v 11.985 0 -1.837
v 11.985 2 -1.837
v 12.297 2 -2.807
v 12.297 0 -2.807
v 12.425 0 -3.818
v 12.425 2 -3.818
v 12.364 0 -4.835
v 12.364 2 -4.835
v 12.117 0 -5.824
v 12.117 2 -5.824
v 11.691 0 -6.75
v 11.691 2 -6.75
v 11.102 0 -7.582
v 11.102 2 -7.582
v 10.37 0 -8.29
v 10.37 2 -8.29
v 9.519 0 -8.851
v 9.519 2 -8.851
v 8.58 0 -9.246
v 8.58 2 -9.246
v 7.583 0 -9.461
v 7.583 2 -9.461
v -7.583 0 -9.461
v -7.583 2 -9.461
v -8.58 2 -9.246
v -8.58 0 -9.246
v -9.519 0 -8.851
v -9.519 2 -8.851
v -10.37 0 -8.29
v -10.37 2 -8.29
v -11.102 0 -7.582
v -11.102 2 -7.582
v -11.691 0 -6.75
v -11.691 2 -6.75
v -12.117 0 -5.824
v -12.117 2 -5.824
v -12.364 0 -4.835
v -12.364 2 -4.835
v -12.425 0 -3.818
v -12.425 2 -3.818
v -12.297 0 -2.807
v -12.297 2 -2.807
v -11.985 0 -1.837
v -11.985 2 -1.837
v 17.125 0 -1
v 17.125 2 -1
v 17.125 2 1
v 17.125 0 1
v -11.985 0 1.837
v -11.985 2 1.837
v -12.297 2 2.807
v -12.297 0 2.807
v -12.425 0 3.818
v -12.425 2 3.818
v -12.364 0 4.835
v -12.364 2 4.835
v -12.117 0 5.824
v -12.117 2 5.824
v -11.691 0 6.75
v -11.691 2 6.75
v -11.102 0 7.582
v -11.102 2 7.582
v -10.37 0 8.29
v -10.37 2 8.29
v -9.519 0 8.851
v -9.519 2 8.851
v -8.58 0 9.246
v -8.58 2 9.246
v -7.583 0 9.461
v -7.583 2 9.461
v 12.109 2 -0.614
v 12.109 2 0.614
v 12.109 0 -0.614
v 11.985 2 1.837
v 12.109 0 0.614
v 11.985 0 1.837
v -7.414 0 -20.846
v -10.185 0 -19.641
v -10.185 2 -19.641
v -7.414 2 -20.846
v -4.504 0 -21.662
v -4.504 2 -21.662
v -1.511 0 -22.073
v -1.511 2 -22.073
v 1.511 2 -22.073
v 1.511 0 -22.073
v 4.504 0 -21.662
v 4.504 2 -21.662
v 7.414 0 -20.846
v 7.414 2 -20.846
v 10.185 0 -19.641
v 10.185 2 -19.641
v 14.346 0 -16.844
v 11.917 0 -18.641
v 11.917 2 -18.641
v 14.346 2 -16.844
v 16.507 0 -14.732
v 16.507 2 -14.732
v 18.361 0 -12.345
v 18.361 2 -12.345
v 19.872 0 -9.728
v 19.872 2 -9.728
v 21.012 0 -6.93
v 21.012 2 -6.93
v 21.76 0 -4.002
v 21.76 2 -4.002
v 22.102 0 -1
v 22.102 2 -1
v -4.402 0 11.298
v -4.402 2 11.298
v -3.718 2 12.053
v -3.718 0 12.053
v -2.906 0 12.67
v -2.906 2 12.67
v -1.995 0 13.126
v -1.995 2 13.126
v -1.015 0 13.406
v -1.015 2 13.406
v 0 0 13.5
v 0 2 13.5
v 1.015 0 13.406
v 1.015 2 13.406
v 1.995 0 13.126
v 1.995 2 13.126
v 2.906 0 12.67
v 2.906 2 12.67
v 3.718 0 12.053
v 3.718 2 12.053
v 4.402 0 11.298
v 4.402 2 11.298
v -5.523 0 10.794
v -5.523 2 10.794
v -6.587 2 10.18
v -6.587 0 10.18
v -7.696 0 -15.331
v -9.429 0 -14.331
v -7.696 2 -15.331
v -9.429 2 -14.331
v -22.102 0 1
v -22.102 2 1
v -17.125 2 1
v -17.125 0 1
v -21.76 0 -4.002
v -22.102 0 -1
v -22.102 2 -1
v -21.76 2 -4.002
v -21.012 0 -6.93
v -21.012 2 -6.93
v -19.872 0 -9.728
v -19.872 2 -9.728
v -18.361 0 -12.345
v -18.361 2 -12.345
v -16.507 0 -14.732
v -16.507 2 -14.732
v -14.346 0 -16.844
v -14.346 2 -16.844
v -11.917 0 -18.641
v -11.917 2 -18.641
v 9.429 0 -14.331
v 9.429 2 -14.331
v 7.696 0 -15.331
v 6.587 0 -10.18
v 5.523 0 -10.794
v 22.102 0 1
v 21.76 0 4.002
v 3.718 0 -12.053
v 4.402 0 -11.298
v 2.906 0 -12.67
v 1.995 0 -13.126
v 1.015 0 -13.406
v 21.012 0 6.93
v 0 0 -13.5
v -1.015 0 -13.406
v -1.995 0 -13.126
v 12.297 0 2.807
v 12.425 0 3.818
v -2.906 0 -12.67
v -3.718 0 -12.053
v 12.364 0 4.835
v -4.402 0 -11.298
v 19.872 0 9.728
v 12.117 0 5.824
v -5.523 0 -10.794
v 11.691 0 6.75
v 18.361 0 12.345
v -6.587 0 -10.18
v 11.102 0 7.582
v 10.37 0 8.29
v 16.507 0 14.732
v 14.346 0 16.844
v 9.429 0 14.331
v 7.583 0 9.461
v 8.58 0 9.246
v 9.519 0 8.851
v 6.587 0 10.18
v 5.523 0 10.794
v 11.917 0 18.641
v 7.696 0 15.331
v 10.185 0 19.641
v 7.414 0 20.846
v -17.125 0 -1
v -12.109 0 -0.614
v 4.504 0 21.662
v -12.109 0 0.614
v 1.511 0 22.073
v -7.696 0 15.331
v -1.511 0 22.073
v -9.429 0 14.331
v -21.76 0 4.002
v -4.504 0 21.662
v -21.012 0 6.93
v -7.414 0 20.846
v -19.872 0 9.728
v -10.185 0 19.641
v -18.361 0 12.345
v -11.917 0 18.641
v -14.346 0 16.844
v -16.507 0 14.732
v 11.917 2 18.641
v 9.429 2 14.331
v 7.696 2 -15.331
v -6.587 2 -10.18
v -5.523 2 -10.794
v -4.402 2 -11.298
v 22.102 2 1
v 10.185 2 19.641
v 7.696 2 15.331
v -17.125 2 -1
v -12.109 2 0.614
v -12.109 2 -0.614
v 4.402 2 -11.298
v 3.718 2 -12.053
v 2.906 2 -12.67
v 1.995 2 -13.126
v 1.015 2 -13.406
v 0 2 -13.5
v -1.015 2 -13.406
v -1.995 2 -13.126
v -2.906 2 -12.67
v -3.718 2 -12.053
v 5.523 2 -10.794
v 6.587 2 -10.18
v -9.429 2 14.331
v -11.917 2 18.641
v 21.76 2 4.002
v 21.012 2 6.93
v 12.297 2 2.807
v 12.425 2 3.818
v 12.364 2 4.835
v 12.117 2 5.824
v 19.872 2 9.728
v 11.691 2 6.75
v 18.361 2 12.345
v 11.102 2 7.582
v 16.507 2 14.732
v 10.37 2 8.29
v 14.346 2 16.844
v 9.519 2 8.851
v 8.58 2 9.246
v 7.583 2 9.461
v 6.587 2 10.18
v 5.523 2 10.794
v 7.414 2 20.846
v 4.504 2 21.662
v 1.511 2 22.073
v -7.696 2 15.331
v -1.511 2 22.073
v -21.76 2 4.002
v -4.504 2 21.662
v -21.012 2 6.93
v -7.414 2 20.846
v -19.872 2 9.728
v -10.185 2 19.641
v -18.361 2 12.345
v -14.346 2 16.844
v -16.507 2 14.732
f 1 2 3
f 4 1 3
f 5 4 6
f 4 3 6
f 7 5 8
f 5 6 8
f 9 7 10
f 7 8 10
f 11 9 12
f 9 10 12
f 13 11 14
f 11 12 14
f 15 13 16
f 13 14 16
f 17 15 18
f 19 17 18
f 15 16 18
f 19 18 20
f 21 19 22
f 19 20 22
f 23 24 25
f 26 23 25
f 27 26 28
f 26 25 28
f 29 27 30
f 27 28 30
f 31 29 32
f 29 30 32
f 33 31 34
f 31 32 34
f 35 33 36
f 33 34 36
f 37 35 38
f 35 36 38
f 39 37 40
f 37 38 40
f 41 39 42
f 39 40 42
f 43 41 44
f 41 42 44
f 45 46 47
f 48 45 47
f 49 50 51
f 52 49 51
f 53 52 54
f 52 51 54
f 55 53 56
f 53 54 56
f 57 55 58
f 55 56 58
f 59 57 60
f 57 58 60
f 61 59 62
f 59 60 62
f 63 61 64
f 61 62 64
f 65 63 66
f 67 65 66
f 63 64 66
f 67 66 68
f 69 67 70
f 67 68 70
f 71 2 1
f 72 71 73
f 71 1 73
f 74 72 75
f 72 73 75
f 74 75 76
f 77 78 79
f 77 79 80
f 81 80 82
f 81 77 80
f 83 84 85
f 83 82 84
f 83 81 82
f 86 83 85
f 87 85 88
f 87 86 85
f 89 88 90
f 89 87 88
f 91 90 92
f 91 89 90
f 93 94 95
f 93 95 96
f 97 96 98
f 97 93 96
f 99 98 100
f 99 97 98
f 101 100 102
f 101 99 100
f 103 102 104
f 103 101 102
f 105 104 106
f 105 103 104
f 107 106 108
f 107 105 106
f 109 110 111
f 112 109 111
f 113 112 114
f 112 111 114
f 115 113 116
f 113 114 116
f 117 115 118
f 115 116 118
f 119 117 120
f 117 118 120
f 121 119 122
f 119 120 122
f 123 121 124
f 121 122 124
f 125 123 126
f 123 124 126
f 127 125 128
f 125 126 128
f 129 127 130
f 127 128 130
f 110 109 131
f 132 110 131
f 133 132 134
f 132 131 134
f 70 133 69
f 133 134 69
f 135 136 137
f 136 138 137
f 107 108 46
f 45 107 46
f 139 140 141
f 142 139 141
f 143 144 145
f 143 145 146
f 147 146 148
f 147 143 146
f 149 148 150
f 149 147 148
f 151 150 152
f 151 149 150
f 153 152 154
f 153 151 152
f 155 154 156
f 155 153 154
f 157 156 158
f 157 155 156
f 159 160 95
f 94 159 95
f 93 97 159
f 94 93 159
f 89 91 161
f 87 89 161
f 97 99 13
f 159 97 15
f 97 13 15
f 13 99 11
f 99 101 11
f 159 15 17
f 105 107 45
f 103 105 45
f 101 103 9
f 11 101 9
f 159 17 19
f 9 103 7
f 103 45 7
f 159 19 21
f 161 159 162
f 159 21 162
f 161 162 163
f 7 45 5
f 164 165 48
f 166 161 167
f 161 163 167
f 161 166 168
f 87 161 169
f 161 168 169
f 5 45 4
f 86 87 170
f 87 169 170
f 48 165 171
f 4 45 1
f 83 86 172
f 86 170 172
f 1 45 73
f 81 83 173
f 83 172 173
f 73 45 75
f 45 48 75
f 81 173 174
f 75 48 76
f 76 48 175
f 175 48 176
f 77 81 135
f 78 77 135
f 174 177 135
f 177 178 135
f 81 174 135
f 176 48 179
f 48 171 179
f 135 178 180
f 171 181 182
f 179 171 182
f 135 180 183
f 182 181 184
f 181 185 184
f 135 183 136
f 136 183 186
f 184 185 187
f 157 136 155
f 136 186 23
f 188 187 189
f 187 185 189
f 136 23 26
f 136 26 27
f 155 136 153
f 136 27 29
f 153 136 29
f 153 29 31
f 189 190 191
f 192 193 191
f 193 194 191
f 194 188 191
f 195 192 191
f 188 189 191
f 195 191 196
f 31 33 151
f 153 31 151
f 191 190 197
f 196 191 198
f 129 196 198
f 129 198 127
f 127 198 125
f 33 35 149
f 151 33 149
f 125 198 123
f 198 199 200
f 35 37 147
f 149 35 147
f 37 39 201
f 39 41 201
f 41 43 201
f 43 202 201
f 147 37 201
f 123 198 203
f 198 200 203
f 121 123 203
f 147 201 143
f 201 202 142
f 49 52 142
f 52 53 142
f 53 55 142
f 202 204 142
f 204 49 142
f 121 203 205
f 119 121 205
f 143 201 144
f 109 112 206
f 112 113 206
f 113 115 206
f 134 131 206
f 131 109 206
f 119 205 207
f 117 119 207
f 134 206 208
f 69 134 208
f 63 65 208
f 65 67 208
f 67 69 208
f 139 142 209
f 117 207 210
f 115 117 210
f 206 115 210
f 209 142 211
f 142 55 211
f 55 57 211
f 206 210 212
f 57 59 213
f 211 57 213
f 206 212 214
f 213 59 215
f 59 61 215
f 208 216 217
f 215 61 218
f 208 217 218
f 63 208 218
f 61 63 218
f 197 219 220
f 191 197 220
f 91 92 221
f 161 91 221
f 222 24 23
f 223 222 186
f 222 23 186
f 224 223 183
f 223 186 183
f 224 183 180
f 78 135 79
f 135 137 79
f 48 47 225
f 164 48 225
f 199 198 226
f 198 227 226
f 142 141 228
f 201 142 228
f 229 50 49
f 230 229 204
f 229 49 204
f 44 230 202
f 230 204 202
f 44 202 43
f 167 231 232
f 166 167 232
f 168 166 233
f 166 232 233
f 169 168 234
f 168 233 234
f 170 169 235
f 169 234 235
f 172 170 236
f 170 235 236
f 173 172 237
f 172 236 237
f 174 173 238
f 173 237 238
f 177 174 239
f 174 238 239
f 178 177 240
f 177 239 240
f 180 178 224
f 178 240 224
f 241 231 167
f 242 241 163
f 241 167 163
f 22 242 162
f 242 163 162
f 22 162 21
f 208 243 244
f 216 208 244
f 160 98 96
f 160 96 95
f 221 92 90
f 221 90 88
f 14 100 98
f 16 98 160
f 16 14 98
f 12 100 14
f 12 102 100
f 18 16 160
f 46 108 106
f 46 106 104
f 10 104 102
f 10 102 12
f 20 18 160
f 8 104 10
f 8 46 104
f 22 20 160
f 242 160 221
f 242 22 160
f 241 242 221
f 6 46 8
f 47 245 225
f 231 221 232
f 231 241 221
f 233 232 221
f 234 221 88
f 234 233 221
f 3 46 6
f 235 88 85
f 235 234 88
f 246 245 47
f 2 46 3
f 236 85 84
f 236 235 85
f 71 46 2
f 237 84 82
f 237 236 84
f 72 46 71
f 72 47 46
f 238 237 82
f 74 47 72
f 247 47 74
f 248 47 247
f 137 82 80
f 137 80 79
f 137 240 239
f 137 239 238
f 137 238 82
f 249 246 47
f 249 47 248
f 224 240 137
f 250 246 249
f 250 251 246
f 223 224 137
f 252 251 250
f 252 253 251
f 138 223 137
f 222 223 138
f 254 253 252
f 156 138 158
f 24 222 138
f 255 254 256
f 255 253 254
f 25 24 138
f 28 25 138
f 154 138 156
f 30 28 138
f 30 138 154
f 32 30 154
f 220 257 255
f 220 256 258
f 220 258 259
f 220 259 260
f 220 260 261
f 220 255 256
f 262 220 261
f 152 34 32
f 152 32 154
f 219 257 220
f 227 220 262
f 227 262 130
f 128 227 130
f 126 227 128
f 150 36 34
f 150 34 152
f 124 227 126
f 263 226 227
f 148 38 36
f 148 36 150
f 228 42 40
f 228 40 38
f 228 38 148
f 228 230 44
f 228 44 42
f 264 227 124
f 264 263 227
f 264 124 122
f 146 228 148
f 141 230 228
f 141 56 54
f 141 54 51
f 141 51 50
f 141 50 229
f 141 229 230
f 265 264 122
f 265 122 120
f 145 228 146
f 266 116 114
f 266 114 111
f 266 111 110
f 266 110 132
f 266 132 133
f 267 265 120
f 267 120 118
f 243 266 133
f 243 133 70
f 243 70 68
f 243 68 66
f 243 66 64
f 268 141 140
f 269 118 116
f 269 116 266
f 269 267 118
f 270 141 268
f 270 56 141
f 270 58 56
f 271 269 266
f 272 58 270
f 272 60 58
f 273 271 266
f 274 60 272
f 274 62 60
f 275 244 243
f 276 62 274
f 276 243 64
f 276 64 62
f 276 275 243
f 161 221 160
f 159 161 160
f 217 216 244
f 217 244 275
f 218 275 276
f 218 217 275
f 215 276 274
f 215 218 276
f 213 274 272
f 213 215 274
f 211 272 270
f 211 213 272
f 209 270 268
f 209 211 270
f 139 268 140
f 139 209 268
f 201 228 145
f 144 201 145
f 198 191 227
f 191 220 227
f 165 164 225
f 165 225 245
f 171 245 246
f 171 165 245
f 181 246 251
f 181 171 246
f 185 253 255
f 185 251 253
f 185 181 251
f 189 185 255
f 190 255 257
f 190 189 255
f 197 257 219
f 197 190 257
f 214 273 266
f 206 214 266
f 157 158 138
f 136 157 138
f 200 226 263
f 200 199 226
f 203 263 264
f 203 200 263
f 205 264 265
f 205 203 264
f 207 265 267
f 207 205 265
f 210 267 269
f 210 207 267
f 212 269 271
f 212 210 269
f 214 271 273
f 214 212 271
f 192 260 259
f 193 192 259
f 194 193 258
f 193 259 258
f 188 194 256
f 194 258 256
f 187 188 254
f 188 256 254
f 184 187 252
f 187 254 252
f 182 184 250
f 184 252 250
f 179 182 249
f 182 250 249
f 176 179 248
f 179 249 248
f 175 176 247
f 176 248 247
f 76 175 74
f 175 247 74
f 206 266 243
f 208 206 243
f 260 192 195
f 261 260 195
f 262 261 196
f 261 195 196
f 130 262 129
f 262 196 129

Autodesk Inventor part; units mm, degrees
ref_plane "YZ Plane" through (0, 0, 0) normal (1, 0, 0) x (0, 1, 0)
ref_plane "XZ Plane" through (0, 0, 0) normal (0, 1, 0) x (-1, 0, 0)
ref_plane "XY Plane" through (0, 0, 0) normal (0, 0, 1) x (1, 0, 0)
sketch "Sketch1" plane through (0, 0, 0) normal (0, 1, 0) x (-1, 0, 0)
  circle A0 centre (0, 0) radius 22.125
  circle A1 centre (0, 0) radius 12.125
  dimension "d0" = 44.25
  dimension "d1" = 24.25
extrude "Extrusion1" add sketch "Sketch1" along normal blind 2
sketch "Sketch2" plane through (0, 2, 0) normal (0, 1, 0) x (1, 0, 0)
  line L0 (-27.125, -1) -> (-17.125, -1)
  line L1 (-17.125, -1) -> (-17.125, 1)
  line L2 (-17.125, 1) -> (-27.125, 1)
  line L3 (-27.125, 1) -> (-27.125, -1)
  point P0 (0, 0)
  dimension "d4" = 1
  dimension "d5" = 2
  dimension "d6" = 10
  dimension "d7" = 17.125
extrude "Extrusion2" cut sketch "Sketch2" against normal blind 2
pattern_circular "Circular Pattern1" count 6 over 360 about axis through (0, -10, 0) along (0, 1, 0) of "Extrusion2"
sketch "Sketch3" plane through (0, 2, 0) normal (0, 1, 0) x (1, 0, 0)
  circle A0 centre (-6.9282, -4) radius 5.5
  line L0 (-6.9282, -4) -> (0, 0) construction
  line L1 (-37.5572, 0) -> (32.0456, 0) projected
  dimension "d13" = 11
  dimension "d14" = 30
  dimension "d15" = 4
extrude "Extrusion3" cut sketch "Sketch3" against normal blind 2
pattern_circular "Circular Pattern2" count 6 over 360 about axis through (0, -10, 0) along (0, 1, 0) of "Extrusion3"
properties part number "Ring_n4"
